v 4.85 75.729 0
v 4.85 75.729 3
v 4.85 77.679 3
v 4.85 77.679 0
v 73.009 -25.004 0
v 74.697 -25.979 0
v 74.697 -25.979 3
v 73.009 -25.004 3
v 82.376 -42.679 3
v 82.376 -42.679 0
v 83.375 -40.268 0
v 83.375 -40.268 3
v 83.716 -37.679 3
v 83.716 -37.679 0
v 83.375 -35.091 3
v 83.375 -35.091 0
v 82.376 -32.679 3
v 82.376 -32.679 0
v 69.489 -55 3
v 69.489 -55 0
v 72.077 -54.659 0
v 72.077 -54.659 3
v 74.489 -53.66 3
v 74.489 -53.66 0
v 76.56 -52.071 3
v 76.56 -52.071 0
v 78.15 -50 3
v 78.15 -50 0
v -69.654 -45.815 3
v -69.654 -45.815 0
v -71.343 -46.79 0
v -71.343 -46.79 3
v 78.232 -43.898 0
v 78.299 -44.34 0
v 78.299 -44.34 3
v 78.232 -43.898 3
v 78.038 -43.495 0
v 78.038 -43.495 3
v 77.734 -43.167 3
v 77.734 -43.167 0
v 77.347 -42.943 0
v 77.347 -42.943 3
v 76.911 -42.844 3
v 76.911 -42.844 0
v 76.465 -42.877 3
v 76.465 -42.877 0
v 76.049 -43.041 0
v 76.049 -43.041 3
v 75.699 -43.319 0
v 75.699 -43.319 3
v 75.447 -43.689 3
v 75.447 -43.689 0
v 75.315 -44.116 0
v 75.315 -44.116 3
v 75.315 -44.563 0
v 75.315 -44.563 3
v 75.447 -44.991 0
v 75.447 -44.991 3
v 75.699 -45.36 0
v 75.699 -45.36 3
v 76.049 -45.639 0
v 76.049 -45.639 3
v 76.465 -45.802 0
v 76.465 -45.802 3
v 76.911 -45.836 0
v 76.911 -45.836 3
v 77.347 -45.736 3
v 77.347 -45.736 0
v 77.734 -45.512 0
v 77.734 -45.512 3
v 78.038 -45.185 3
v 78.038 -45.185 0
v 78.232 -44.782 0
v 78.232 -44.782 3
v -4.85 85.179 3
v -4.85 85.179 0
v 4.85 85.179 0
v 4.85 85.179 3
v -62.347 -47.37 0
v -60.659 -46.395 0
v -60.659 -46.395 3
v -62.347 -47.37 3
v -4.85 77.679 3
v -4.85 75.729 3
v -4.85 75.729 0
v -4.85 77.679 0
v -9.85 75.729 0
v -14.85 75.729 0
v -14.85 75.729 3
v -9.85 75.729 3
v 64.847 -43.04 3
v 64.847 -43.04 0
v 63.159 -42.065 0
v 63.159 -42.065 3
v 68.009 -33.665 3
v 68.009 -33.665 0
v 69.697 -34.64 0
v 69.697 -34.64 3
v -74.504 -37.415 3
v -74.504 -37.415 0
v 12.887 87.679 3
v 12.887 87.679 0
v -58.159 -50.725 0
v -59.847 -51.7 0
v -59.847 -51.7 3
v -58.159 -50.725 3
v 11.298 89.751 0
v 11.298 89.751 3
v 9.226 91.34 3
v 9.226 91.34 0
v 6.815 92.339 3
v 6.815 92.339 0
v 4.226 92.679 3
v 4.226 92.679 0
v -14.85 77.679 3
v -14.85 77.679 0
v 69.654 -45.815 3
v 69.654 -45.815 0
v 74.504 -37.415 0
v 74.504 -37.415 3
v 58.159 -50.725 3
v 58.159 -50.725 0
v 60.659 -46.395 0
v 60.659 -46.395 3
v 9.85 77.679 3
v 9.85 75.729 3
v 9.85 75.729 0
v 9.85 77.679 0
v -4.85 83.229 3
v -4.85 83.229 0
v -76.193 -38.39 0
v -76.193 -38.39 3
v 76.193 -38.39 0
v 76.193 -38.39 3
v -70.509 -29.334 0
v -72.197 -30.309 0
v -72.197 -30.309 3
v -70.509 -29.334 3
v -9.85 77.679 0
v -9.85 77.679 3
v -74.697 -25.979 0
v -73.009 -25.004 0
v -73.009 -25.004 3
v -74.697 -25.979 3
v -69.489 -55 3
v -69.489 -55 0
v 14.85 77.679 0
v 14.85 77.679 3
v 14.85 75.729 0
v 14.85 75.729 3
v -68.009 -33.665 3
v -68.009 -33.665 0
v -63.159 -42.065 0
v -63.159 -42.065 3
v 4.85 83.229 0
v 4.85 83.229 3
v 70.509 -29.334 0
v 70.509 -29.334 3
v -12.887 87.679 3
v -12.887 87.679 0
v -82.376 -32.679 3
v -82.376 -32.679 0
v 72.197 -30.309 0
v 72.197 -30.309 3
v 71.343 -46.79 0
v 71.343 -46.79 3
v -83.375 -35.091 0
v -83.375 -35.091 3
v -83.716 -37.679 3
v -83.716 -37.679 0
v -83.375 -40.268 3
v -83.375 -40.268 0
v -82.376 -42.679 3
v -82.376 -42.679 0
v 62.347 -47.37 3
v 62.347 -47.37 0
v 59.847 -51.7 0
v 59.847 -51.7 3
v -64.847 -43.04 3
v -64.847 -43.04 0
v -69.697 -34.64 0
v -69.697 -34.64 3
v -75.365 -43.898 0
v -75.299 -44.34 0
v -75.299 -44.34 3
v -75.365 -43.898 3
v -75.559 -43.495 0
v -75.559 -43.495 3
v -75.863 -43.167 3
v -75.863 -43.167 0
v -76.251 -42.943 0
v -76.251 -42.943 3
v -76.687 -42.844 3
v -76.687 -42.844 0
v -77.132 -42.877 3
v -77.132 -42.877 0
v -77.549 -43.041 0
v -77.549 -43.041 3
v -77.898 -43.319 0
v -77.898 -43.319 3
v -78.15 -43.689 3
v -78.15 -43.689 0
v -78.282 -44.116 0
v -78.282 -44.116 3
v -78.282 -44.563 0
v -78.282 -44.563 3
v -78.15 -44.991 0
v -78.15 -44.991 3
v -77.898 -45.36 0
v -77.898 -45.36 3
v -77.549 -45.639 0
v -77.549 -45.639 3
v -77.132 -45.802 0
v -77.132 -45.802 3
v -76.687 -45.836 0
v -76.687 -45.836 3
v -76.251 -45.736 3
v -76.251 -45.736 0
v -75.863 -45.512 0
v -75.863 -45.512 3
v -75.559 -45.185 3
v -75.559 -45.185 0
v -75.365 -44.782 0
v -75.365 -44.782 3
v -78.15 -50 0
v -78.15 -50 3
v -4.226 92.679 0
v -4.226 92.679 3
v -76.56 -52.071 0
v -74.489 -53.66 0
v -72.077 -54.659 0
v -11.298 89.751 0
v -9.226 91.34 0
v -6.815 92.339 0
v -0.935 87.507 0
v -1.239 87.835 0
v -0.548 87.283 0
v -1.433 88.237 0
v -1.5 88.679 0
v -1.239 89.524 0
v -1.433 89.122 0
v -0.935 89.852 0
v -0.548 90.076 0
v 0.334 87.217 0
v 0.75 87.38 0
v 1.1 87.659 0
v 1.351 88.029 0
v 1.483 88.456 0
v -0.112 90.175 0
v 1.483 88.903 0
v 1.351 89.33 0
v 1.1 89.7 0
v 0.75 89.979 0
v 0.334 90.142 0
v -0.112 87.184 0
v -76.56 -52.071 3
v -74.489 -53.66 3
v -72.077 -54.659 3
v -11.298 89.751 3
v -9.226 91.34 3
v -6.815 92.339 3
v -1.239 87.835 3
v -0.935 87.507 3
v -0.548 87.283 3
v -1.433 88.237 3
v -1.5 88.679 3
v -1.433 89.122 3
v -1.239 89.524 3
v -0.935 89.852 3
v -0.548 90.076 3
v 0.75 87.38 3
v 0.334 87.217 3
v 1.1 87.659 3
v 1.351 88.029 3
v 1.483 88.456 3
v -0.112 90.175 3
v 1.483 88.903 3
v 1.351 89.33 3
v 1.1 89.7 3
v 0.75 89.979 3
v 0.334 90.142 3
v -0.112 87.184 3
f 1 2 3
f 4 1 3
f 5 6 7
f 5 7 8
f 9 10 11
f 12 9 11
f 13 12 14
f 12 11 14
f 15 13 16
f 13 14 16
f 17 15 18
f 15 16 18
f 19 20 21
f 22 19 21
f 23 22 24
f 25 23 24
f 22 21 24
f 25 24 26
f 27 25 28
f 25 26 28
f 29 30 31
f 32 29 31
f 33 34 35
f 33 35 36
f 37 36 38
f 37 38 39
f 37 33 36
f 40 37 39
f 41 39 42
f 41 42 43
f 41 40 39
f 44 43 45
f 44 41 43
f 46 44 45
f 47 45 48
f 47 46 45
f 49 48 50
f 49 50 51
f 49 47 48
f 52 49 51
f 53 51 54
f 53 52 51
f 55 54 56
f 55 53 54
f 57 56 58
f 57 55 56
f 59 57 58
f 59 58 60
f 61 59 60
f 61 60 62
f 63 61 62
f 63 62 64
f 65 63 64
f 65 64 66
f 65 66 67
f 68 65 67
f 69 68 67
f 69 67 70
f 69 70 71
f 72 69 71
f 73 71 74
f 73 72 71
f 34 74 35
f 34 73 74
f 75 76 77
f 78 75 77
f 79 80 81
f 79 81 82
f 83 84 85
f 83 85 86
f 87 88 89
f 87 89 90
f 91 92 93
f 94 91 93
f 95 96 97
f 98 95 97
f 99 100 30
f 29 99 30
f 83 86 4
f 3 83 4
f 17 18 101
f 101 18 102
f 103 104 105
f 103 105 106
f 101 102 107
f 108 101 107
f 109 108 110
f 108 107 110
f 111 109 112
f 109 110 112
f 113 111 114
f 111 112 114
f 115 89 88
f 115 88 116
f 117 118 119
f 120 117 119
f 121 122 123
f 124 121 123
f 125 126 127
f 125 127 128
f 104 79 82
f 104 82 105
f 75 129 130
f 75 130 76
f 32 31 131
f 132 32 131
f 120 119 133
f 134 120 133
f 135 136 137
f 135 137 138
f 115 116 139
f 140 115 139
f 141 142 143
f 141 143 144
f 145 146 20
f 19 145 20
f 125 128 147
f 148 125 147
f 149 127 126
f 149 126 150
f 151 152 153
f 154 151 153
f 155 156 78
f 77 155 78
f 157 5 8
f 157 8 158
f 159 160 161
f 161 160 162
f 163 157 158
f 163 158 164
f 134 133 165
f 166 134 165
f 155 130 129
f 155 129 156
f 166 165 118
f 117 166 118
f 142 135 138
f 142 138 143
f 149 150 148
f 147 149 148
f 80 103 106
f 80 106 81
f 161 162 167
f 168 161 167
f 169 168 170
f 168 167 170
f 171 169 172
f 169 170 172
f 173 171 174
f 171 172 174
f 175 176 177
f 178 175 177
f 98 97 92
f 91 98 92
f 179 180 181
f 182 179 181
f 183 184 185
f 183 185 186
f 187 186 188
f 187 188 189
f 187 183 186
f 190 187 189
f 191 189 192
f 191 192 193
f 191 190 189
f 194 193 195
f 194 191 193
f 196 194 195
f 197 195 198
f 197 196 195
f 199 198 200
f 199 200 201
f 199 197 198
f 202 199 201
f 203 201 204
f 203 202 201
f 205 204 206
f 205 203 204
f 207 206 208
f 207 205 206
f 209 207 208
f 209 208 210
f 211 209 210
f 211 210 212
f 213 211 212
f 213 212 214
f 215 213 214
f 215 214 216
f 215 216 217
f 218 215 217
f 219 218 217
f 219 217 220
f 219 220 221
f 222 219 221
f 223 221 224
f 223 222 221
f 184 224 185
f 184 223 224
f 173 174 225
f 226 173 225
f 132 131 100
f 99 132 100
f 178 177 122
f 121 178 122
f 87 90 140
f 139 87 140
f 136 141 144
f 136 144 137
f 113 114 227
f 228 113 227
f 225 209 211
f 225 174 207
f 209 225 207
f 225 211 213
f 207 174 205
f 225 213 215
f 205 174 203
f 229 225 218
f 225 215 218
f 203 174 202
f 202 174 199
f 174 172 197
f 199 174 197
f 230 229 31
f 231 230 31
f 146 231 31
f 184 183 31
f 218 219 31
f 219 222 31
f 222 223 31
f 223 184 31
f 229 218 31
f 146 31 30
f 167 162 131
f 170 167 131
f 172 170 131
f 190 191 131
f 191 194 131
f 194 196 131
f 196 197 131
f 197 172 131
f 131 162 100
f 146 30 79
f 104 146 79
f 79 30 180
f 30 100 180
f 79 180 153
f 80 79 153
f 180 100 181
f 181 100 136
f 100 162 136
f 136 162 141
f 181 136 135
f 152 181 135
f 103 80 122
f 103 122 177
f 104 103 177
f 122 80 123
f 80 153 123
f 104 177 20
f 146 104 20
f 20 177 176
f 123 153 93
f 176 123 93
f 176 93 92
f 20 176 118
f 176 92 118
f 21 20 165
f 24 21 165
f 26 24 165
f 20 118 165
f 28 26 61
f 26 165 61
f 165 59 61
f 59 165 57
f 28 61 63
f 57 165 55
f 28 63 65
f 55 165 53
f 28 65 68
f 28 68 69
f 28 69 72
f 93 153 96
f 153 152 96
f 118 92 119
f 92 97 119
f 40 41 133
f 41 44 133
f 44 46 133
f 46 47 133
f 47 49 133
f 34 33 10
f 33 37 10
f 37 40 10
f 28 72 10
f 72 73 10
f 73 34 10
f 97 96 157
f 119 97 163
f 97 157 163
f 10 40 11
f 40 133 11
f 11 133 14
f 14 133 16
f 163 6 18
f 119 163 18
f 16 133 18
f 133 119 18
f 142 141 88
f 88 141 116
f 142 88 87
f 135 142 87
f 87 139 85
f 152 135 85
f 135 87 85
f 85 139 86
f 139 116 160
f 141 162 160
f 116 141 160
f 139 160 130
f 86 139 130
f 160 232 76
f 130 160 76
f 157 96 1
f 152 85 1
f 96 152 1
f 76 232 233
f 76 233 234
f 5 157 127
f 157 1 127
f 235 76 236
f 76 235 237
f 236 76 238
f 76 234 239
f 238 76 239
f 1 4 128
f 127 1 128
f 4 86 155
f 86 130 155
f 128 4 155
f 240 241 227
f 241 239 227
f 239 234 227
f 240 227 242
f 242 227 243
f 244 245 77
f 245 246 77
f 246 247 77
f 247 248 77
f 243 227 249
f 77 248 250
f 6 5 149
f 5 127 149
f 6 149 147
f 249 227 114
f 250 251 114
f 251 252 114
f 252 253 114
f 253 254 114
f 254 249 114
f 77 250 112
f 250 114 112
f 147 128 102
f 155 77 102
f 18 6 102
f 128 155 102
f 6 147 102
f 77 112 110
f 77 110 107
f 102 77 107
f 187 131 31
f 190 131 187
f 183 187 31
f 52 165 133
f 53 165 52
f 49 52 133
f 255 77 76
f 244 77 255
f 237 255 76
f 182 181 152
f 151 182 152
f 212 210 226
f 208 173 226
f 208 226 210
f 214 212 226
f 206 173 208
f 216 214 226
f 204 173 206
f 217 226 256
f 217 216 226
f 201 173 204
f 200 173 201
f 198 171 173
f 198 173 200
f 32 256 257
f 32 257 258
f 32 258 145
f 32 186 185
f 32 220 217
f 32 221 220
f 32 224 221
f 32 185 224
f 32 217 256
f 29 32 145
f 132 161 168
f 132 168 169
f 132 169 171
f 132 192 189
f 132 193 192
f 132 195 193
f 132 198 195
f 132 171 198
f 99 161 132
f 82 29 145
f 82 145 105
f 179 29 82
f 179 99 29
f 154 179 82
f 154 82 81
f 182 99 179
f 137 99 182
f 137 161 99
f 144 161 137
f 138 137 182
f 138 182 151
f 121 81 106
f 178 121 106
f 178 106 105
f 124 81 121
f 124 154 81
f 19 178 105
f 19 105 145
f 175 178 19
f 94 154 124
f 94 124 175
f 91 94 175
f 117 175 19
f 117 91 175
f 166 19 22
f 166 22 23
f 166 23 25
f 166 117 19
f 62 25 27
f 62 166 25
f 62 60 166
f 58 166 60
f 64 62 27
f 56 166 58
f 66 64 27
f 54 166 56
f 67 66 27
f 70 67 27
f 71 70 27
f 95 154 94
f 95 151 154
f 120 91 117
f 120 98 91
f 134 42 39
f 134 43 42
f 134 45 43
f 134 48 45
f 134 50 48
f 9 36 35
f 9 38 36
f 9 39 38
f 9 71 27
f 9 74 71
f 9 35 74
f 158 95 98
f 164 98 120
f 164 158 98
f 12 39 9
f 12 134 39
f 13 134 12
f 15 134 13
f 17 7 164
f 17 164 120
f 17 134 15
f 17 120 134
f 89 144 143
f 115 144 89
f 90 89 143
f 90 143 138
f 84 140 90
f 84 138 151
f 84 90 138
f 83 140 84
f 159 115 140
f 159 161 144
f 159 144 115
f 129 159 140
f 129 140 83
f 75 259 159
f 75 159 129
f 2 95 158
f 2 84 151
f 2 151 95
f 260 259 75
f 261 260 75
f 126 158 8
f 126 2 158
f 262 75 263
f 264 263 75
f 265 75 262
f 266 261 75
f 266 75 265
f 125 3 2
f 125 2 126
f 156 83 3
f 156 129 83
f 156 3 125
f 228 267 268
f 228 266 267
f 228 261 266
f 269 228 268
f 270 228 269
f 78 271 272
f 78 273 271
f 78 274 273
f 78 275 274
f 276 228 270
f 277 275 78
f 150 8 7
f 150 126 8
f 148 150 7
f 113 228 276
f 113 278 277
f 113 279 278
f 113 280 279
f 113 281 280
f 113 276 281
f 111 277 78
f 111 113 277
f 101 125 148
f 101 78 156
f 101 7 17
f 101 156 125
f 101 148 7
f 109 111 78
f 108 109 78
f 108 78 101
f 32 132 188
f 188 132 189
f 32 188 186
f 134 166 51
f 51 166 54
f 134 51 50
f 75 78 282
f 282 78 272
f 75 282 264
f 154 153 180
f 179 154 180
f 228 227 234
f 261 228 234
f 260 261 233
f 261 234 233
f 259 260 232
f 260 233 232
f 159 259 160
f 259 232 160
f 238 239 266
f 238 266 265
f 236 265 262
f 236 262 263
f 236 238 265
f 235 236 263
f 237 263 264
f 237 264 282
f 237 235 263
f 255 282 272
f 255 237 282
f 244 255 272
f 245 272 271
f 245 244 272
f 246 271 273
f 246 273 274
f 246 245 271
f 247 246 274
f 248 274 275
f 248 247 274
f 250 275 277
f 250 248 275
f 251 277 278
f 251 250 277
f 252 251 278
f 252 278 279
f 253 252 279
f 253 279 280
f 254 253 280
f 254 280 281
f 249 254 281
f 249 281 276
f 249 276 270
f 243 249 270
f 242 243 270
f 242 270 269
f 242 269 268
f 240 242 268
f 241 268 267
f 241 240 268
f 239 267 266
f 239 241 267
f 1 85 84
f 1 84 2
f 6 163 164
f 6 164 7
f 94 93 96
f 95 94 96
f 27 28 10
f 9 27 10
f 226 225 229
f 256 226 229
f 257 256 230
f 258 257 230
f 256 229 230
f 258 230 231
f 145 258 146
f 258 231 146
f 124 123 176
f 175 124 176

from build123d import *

# Parameters (mm, degrees)
SKETCH_1_R      = 1.5
SKETCH_1_W      = 9.7
SKETCH_1_H      = 1.95
SKETCH_1_W_2    = 5
EXTRUDE_1_DEPTH = 3


with BuildPart() as part:
    # Эскиз1 → Бобышка-Вытянуть1 (new body)
    with BuildSketch(Plane.XY):
        with BuildLine():
            Line((-69.489291724, -55), (69.489291724, -55))
            ThreePointArc((69.489291724, -55), (74.489291724, -53.660254038), (78.149545762, -50))
            Line((78.149545762, -50), (82.37604307, -42.679491924))
            ThreePointArc((82.37604307, -42.679491924), (83.715789032, -37.679491924), (82.37604307, -32.679491924))
            Line((82.37604307, -32.679491924), (12.886751346, 87.679491924))
            ThreePointArc((12.886751346, 87.679491924), (9.226497308, 91.339745962), (4.226497308, 92.679491924))
            Line((4.226497308, 92.679491924), (-4.226497308, 92.679491924))
            ThreePointArc((-4.226497308, 92.679491924), (-9.226497308, 91.339745962), (-12.886751346, 87.679491924))
            Line((-12.886751346, 87.679491924), (-82.37604307, -32.679491924))
            ThreePointArc((-82.37604307, -32.679491924), (-83.715789032, -37.679491924), (-82.37604307, -42.679491924))
            Line((-82.37604307, -42.679491924), (-78.149545762, -50))
            ThreePointArc((-78.149545762, -50), (-74.489291724, -53.660254038), (-69.489291724, -55))
        make_face()
        with Locations((-76.798692801, -44.339745962)):
            Circle(SKETCH_1_R, mode=Mode.SUBTRACT)
        with Locations(Location((0, 88.679491924, 0), (0, 0, 180))):
            Circle(SKETCH_1_R, mode=Mode.SUBTRACT)
        with Locations((76.798692801, -44.339745962)):
            Circle(SKETCH_1_R, mode=Mode.SUBTRACT)
        Polygon((-71.342603888, -46.789969171), (-76.192603888, -38.389522754), (-74.503854351, -37.414522754), (-69.653854351, -45.814969171), align=None, mode=Mode.SUBTRACT)
        with Locations((0, 84.204491924)):
            Rectangle(SKETCH_1_W, SKETCH_1_H, mode=Mode.SUBTRACT)
        Polygon((76.192603888, -38.389522754), (71.342603888, -46.789969171), (69.653854351, -45.814969171), (74.503854351, -37.414522754), align=None, mode=Mode.SUBTRACT)
        Polygon((-64.84741336, -43.039969171), (-69.69741336, -34.639522754), (-68.008663822, -33.664522754), (-63.158663822, -42.064969171), align=None, mode=Mode.SUBTRACT)
        with Locations((0, 76.704491924)):
            Rectangle(SKETCH_1_W, SKETCH_1_H, mode=Mode.SUBTRACT)
        Polygon((69.69741336, -34.639522754), (64.84741336, -43.039969171), (63.158663822, -42.064969171), (68.008663822, -33.664522754), align=None, mode=Mode.SUBTRACT)
        Polygon((70.508663822, -29.334395735), (72.19741336, -30.309395735), (74.69741336, -25.979268716), (73.008663822, -25.004268716), align=None, mode=Mode.SUBTRACT)
        Polygon((62.34741336, -47.370096189), (59.84741336, -51.700223208), (58.158663822, -50.725223208), (60.658663822, -46.395096189), align=None, mode=Mode.SUBTRACT)
        with Locations((-12.35, 76.704491924)):
            Rectangle(SKETCH_1_W_2, SKETCH_1_H, mode=Mode.SUBTRACT)
        with Locations((12.35, 76.704491924)):
            Rectangle(SKETCH_1_W_2, SKETCH_1_H, mode=Mode.SUBTRACT)
        Polygon((-60.658663822, -46.395096189), (-62.34741336, -47.370096189), (-59.84741336, -51.700223208), (-58.158663822, -50.725223208), align=None, mode=Mode.SUBTRACT)
        Polygon((-70.508663822, -29.334395735), (-73.008663822, -25.004268716), (-74.69741336, -25.979268716), (-72.19741336, -30.309395735), align=None, mode=Mode.SUBTRACT)
    extrude(amount=EXTRUDE_1_DEPTH)


solid = part.part
